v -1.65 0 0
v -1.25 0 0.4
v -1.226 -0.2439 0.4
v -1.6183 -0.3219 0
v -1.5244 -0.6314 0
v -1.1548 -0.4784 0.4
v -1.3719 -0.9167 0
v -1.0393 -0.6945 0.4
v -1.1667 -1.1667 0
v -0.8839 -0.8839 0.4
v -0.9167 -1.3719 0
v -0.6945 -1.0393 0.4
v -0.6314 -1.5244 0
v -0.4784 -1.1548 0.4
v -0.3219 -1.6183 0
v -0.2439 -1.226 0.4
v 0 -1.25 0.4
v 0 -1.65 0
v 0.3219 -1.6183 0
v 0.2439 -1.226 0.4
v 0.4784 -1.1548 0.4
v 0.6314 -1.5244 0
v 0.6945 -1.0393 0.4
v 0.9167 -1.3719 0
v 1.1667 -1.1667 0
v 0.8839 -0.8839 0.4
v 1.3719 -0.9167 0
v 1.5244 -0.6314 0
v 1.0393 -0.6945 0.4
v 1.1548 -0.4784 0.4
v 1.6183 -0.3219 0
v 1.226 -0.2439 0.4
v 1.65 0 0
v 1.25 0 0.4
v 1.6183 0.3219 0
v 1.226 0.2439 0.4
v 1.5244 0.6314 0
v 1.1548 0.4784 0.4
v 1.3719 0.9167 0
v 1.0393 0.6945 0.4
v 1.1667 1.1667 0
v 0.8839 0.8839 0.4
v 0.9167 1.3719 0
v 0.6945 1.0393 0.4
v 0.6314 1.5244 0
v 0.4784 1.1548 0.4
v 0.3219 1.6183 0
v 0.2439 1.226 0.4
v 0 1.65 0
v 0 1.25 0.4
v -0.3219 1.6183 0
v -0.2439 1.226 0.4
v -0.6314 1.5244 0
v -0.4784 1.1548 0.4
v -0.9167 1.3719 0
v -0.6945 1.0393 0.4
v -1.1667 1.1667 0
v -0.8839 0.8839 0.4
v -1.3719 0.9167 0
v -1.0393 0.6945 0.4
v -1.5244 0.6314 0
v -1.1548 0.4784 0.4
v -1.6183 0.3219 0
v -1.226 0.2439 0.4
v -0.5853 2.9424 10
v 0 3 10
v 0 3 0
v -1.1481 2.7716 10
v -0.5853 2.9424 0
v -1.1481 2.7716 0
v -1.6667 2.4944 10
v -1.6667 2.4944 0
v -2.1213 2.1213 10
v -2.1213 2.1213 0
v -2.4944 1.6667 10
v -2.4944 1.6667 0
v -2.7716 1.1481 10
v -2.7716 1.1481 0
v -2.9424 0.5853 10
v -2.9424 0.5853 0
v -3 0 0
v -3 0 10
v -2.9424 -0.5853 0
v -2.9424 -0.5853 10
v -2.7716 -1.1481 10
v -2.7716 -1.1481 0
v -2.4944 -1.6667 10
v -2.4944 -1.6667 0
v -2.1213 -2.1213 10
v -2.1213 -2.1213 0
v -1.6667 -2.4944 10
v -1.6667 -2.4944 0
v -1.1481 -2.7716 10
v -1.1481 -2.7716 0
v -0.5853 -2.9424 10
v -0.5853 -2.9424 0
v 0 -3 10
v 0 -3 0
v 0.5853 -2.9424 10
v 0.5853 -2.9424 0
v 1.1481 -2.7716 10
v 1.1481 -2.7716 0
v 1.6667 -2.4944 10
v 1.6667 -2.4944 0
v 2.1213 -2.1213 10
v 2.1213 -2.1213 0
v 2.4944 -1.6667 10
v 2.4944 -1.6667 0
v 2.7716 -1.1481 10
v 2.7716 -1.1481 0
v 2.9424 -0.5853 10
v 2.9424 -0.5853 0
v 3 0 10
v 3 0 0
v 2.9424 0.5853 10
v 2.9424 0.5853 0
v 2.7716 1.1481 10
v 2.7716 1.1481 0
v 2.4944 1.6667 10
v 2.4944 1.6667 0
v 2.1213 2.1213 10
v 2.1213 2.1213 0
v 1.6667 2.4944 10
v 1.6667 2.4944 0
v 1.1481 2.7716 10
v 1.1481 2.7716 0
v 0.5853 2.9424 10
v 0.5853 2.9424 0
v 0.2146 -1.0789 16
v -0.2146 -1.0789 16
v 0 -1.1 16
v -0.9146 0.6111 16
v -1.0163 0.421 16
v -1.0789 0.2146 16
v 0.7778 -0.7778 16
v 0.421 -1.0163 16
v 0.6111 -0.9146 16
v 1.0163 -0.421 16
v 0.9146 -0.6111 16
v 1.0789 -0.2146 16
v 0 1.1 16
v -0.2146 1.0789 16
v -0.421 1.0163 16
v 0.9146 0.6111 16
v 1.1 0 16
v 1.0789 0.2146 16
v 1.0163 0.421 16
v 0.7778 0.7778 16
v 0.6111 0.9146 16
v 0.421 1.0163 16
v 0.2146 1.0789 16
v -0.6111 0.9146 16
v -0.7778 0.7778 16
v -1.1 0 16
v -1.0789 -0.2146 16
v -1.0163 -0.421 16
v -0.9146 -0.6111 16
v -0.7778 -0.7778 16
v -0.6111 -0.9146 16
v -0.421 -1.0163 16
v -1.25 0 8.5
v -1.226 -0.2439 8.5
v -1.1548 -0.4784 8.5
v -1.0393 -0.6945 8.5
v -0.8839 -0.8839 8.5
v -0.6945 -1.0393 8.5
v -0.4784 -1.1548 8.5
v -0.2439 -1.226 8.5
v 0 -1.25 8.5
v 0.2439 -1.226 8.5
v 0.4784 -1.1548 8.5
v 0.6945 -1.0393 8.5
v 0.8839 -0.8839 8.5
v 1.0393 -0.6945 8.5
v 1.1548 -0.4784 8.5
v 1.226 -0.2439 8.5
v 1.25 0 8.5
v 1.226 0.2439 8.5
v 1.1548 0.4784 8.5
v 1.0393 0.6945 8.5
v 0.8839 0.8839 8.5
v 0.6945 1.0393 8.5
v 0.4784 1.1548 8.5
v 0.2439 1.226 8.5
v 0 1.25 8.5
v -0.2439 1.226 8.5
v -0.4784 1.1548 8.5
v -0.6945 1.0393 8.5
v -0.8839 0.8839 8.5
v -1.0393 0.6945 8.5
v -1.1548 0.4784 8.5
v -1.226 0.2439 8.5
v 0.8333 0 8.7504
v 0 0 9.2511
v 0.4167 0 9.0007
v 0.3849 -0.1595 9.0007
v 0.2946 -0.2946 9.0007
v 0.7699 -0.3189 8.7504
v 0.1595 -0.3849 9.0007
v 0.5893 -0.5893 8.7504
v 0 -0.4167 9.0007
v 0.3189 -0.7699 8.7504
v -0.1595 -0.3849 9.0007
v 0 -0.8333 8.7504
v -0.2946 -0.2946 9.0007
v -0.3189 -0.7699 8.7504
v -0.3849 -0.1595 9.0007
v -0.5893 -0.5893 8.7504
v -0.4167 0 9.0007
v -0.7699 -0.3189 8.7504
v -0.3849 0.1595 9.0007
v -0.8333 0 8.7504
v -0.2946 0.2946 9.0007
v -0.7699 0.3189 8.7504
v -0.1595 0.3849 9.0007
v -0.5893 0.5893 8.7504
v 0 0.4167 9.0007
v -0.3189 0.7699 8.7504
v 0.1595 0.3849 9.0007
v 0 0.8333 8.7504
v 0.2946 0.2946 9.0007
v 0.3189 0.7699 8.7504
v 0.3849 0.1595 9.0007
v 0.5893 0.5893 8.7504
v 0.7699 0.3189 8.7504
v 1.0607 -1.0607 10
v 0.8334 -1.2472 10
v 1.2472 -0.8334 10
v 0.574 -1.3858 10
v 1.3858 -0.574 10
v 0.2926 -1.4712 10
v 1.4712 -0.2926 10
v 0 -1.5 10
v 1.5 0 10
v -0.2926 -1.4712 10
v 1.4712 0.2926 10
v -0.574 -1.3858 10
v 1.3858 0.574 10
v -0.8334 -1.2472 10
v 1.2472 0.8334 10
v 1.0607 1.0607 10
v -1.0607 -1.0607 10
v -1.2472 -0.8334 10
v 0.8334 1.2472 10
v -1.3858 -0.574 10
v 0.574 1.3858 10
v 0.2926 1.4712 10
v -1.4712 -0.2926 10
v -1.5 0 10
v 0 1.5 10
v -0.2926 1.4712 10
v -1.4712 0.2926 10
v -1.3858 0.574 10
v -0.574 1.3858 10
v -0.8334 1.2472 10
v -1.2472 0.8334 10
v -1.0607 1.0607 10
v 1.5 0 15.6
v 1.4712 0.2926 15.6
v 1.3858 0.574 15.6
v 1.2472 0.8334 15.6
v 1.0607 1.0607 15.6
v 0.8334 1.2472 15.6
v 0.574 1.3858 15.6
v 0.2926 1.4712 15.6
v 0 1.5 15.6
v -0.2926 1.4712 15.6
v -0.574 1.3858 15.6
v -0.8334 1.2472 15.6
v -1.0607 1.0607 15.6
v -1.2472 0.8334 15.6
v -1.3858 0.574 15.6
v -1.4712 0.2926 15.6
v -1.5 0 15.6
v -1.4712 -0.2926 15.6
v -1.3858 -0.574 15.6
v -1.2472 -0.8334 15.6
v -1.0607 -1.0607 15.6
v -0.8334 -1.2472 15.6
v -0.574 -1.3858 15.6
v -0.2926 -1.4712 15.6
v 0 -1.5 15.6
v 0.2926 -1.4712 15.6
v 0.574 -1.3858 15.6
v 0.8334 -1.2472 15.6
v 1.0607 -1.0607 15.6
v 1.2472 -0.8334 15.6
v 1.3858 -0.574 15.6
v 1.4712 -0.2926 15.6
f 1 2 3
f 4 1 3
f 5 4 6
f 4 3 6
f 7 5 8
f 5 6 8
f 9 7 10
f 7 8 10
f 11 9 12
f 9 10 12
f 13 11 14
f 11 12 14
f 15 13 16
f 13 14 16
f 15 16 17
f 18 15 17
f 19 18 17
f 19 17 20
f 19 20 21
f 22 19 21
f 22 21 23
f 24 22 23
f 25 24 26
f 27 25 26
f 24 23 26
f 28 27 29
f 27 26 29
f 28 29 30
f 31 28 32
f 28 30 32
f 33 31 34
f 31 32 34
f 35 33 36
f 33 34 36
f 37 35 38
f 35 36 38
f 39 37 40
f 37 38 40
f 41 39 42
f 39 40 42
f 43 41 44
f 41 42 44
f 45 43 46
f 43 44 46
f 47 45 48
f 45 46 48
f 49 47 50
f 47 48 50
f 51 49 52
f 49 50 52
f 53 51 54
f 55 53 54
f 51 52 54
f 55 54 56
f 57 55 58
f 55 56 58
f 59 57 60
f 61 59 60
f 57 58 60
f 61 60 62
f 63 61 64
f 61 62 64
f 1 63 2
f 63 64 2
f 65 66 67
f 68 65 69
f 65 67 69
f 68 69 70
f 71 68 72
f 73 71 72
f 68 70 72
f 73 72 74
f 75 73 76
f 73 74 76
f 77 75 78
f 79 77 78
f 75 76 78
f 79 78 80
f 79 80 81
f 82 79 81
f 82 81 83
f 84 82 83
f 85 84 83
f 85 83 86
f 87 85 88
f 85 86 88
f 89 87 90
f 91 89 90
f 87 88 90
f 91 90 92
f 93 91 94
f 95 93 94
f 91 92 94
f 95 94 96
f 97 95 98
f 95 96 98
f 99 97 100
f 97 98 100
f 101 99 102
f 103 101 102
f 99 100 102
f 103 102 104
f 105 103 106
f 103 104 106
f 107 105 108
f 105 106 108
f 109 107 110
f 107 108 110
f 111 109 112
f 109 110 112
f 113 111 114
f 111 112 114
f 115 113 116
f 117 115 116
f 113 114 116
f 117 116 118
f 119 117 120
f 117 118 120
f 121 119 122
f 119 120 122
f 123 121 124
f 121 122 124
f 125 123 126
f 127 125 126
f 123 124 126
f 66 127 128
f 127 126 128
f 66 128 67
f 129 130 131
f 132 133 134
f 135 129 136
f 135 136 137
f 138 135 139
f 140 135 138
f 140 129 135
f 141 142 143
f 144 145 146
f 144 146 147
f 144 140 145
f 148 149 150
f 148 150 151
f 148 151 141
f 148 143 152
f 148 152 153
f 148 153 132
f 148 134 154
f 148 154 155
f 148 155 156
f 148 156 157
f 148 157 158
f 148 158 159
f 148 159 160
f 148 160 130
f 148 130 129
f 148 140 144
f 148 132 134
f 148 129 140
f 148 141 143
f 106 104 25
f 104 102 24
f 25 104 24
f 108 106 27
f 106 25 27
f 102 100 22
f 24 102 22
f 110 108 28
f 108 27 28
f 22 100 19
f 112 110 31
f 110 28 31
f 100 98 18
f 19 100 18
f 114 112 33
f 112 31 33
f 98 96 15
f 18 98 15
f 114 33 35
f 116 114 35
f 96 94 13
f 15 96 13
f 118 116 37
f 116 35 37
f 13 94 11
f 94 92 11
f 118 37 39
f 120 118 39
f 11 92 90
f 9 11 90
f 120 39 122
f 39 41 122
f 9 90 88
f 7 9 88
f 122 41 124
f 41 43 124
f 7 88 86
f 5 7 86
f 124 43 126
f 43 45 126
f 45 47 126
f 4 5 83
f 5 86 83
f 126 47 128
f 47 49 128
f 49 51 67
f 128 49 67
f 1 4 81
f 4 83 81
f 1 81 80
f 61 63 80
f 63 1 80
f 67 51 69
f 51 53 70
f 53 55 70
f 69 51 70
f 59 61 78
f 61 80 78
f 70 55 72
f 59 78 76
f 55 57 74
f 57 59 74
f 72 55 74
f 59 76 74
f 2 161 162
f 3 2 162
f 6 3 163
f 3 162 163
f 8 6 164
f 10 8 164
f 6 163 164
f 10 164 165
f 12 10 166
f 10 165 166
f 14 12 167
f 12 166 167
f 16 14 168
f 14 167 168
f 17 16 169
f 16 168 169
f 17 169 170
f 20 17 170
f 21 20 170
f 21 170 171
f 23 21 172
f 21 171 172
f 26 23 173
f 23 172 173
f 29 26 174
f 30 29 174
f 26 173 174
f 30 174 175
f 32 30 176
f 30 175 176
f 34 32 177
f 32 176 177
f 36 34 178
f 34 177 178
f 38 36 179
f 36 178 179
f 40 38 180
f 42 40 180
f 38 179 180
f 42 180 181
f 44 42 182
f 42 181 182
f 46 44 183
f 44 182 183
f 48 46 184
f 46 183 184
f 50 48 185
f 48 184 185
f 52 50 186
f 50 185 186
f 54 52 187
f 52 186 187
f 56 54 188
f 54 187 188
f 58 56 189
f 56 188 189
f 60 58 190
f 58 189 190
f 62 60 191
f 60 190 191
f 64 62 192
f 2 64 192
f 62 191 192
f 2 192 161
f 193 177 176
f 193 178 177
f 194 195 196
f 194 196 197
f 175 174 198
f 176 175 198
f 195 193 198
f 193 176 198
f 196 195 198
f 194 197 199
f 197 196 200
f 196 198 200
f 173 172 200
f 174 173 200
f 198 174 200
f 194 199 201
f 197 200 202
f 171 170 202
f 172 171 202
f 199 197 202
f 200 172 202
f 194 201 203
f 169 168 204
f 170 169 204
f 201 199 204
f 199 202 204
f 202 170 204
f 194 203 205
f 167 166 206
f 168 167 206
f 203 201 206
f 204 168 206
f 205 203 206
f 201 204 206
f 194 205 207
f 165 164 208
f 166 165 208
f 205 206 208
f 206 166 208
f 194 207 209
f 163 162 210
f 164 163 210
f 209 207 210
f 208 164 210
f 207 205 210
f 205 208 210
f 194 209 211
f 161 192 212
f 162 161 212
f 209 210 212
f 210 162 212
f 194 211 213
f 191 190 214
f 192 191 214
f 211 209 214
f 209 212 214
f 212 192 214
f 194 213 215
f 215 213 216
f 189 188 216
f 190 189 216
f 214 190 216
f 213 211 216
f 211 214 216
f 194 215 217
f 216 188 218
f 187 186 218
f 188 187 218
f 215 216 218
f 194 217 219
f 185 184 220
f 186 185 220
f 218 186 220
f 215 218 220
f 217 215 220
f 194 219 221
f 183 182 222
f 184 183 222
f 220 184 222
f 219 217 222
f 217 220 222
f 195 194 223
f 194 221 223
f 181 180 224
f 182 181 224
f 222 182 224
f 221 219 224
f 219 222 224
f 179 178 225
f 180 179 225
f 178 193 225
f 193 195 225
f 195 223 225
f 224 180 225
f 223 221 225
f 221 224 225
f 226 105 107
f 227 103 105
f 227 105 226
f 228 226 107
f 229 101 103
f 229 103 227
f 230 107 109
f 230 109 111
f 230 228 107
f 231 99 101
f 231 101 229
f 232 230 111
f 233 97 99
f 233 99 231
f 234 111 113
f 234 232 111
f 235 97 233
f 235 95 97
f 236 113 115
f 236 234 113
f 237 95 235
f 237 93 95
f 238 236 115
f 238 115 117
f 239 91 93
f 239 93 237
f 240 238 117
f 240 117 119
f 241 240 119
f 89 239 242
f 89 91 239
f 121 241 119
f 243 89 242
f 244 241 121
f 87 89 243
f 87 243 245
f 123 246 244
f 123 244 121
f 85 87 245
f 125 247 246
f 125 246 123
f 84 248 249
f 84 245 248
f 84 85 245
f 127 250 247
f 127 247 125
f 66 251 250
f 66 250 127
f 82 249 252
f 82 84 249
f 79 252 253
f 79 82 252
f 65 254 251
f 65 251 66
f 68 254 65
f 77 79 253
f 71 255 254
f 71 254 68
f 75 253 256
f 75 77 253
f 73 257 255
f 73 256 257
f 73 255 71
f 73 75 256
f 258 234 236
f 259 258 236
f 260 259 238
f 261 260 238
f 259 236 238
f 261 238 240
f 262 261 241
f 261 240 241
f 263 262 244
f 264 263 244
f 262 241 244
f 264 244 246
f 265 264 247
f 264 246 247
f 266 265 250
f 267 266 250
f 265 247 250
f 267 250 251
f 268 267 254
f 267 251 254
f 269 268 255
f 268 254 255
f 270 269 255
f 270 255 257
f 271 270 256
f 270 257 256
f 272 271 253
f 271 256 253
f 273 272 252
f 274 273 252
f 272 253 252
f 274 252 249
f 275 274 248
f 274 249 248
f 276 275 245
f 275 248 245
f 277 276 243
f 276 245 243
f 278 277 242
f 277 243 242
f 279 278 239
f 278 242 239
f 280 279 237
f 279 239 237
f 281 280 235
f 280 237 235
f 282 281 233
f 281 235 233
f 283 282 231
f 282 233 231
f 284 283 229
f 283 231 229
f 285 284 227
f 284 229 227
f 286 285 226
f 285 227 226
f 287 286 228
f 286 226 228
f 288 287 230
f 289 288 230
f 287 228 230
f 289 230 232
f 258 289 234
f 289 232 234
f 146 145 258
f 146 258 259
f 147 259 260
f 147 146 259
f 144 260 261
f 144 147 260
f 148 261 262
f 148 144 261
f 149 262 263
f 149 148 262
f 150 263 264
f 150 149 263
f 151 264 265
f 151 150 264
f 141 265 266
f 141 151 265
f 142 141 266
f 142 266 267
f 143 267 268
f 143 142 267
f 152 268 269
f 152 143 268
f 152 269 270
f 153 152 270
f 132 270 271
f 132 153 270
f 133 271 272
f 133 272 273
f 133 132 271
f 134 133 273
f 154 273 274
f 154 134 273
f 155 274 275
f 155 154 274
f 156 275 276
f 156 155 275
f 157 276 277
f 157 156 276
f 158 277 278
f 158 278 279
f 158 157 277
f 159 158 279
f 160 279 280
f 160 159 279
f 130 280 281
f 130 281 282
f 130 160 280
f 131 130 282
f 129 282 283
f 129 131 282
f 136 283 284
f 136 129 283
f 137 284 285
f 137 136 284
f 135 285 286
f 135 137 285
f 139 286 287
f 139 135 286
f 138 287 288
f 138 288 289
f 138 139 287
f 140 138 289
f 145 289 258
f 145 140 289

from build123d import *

# Parameters (mm, degrees)
SKETCH_1_R      = 3
EXTRUDE_1_DEPTH = 10
SKETCH_2_R      = 1.5
EXTRUDE_2_DEPTH = 6
M3X0_5_1_D      = 2.5
M3X0_5_1_DEPTH  = 8.5
M3X0_5_1_TIP    = 0.751075774
CHAMFER_1_SIZE  = 0.4


with BuildPart() as part:
    # ｽｹｯﾁ1 → ﾎﾞｽ - 押し出し1 (new body)
    with BuildSketch(Plane(origin=(0, 0, 0), x_dir=(0, 1, 0), z_dir=(0, 0, 1))):
        Circle(SKETCH_1_R)
    extrude(amount=EXTRUDE_1_DEPTH)

    # ｽｹｯﾁ2 → ﾎﾞｽ - 押し出し2 (add)
    with BuildSketch(Plane.XY.offset(10)):
        Circle(SKETCH_2_R)
    extrude(amount=EXTRUDE_2_DEPTH)

    # M3x0.5 ねじ穴1
    with Locations(Plane(origin=(0, 0, 0), x_dir=(1, 0, 0), z_dir=(0, 0, -1))):
        with Locations((0, 0)):
            Hole(M3X0_5_1_D / 2, depth=M3X0_5_1_DEPTH)
            with Locations((0, 0, -(M3X0_5_1_DEPTH + M3X0_5_1_TIP / 2))):  # 118° drill point
                Cone(0, M3X0_5_1_D / 2, M3X0_5_1_TIP, mode=Mode.SUBTRACT)

    # 面取り1
    chamfer_1_edges = [part.edges().sort_by_distance(p)[0] for p in [
        (1.25, 0, 0),
        (-1.5, 0, 16),
    ]]
    chamfer(chamfer_1_edges, length=CHAMFER_1_SIZE)


solid = part.part
